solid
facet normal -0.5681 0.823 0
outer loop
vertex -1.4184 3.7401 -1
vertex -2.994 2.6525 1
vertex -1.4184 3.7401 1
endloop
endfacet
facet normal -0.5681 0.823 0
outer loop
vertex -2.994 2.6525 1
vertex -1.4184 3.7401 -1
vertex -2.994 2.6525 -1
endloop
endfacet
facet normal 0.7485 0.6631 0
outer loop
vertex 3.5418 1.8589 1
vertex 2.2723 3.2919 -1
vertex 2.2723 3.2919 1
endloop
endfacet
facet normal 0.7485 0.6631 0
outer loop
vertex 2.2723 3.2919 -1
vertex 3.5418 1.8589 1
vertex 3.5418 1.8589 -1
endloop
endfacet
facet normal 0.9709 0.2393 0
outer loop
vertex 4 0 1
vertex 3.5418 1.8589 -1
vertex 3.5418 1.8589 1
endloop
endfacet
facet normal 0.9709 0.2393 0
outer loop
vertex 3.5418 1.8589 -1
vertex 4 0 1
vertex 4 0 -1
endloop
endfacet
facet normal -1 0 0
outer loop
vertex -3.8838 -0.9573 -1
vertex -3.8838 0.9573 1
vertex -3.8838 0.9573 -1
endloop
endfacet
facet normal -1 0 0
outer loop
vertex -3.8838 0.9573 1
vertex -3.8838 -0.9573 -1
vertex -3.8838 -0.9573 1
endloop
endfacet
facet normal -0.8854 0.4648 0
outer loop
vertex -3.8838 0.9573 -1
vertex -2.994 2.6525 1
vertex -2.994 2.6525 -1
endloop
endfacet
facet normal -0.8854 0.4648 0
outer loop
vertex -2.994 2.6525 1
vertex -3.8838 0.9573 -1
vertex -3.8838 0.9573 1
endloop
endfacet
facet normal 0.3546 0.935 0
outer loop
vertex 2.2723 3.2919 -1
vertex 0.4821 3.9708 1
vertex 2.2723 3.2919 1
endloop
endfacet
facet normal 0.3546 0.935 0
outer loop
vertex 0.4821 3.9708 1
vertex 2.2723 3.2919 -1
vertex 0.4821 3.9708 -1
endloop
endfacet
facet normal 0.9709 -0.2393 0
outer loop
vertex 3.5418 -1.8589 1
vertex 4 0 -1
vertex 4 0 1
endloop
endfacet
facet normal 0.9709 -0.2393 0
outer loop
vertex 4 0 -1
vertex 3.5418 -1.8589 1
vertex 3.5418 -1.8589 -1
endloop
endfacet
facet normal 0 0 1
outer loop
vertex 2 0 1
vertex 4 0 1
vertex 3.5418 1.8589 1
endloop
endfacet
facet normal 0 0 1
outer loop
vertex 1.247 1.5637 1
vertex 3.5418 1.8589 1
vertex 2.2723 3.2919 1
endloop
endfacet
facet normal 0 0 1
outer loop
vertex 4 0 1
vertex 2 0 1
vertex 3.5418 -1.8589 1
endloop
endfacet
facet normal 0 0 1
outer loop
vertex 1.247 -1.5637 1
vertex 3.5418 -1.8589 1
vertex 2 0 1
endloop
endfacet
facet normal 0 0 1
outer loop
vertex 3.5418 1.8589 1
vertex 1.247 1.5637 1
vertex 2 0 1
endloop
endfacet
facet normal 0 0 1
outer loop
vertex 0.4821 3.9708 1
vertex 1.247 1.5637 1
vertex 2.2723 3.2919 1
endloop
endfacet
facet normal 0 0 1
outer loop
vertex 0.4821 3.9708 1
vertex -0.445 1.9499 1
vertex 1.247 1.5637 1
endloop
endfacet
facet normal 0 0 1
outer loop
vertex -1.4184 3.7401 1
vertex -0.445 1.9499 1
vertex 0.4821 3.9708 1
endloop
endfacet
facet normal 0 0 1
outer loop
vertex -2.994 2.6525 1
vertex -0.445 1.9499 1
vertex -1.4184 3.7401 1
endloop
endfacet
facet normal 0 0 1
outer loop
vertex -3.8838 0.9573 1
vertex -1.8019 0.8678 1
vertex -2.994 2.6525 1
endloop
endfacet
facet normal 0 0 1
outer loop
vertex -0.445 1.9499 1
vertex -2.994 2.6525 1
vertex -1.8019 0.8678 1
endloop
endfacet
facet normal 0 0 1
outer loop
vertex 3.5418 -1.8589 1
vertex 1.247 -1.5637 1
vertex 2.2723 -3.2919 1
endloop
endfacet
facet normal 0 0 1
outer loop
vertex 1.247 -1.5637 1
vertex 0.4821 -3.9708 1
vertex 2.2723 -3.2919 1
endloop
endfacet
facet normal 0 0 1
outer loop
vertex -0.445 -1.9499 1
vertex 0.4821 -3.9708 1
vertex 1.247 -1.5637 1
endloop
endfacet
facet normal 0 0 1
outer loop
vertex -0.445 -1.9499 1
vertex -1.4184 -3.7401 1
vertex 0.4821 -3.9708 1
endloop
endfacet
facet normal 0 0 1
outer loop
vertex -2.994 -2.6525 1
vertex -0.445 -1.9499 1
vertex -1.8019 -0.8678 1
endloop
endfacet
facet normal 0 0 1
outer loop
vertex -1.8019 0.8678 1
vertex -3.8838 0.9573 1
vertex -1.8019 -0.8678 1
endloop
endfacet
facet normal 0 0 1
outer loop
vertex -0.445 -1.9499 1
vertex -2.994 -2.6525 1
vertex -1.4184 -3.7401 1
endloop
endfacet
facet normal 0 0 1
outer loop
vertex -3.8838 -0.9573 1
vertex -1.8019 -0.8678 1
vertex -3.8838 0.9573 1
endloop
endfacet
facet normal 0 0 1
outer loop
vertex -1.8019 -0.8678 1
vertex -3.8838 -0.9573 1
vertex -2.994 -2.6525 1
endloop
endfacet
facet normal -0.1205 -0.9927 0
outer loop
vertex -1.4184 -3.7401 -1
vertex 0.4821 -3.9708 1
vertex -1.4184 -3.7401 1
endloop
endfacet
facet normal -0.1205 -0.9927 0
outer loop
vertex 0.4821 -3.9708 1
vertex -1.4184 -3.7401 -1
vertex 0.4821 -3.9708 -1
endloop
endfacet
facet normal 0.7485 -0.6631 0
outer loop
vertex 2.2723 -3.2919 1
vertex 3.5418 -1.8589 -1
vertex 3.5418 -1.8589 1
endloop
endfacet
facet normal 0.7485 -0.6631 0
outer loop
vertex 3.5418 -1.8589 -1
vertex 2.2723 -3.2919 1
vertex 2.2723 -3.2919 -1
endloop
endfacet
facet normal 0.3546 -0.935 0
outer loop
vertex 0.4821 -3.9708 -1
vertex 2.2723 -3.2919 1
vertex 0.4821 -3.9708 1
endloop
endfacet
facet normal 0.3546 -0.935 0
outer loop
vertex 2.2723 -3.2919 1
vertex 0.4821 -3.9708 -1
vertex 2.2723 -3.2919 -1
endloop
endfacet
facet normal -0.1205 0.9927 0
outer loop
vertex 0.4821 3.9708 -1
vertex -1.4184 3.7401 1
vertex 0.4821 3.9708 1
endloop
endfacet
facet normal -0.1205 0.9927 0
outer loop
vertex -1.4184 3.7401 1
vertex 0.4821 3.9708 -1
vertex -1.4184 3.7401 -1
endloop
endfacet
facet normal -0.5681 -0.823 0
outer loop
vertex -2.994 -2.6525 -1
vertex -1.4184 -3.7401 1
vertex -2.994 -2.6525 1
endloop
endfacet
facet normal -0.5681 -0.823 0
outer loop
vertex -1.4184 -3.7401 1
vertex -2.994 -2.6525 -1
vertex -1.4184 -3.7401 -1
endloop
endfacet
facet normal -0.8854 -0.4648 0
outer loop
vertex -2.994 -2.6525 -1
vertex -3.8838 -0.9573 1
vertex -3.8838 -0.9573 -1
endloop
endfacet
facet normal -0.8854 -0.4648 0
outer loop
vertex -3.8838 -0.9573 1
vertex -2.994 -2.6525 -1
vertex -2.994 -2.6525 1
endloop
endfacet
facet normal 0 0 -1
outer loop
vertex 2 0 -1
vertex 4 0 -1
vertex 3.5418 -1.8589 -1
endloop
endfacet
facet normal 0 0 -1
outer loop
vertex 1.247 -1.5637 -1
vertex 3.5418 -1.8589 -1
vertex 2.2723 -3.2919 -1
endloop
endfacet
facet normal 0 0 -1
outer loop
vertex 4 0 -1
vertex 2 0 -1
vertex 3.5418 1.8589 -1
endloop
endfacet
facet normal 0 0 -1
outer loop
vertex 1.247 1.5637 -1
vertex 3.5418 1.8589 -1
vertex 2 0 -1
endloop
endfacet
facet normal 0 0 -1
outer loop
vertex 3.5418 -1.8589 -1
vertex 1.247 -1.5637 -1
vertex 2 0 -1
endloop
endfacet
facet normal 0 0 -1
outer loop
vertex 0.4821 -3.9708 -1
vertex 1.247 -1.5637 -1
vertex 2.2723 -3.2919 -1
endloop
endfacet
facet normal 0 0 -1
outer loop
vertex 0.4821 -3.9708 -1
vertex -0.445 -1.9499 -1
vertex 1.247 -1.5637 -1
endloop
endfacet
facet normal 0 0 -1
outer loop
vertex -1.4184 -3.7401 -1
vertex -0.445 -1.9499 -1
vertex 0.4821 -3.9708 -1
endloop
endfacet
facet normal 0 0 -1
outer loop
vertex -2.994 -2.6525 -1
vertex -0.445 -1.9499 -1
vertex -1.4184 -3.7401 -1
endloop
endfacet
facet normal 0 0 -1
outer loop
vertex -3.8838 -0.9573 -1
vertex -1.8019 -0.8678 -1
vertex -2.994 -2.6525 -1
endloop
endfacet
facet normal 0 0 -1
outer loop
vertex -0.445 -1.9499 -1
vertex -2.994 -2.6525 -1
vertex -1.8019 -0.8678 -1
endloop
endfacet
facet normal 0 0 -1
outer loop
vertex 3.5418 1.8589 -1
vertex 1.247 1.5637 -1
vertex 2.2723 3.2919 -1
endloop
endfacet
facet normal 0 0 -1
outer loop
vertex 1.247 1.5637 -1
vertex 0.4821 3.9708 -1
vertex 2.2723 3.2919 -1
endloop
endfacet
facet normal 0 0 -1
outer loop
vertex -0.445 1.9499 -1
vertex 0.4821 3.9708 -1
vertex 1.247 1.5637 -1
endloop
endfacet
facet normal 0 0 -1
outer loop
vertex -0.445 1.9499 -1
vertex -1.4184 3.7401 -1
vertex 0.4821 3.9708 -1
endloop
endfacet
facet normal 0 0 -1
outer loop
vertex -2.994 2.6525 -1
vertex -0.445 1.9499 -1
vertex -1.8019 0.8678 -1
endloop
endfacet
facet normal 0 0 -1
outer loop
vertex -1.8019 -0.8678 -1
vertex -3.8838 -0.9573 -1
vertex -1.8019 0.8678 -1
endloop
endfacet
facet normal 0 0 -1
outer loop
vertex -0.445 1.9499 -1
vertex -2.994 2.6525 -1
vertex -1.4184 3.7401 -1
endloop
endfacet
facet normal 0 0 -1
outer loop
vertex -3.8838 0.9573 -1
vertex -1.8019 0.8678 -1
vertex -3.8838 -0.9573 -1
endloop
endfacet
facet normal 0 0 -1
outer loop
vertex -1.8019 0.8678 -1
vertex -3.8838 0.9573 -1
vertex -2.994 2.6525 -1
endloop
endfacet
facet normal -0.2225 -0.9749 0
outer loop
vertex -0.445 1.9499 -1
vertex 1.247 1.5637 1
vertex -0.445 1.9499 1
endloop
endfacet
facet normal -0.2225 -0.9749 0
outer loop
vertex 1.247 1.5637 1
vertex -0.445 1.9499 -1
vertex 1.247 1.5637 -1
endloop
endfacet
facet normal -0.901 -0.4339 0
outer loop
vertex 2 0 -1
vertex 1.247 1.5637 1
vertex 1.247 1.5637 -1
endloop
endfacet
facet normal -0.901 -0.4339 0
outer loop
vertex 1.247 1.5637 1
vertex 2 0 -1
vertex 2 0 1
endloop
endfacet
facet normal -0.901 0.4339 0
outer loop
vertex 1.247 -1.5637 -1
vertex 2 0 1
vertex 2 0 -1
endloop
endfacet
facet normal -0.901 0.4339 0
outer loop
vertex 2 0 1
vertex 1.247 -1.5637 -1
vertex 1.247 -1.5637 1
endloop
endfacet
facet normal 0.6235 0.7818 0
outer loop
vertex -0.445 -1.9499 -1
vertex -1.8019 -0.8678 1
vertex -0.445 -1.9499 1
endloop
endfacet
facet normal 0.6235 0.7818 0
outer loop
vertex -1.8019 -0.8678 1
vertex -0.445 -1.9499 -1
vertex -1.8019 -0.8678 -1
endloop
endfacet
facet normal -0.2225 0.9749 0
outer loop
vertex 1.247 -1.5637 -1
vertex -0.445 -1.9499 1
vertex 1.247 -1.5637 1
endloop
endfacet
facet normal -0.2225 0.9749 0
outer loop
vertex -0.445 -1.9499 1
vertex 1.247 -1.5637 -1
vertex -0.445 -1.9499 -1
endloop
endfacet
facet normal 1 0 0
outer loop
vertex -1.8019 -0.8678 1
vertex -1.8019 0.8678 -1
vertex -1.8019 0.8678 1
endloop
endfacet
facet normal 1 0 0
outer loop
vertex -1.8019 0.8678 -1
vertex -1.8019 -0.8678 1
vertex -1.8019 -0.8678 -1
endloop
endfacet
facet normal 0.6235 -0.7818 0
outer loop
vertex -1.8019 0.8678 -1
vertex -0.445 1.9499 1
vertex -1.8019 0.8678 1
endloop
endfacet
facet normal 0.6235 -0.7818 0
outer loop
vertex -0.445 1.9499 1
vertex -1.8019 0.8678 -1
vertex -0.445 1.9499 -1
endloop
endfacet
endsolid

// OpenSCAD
module pin(outer_radius, inner_radius, width)
{
    difference()
    {
        cylinder(h = width, r = outer_radius, center = true);
        cylinder(h = width + 1, r = inner_radius, center = true);
    }
}


module holder()
{
    union()
    {
        difference()
        {
            union()
            {
                difference()
                {
                    translate([ 3, 0, -3 ]) cube(size = 6, center = true);
                    rotate(a = 90, v = [ 1, 0, 0 ]) cylinder(h = 7, r = 3, center = true);
                    translate([ 6, 0, 0 ]) rotate(a = 90, v = [ 1, 0, 0 ]) cylinder(h = 7, r = 3, center = true);
                }

                rotate(a = 90, v = [ 1, 0, 0 ])
                {

                }
            }

            rotate(a = 90, v = [ 1, 0, 0 ]) cylinder(h = 7, r = 1, center = true);
        }
    }
}

pin(4, 2, 2);
// holder();
